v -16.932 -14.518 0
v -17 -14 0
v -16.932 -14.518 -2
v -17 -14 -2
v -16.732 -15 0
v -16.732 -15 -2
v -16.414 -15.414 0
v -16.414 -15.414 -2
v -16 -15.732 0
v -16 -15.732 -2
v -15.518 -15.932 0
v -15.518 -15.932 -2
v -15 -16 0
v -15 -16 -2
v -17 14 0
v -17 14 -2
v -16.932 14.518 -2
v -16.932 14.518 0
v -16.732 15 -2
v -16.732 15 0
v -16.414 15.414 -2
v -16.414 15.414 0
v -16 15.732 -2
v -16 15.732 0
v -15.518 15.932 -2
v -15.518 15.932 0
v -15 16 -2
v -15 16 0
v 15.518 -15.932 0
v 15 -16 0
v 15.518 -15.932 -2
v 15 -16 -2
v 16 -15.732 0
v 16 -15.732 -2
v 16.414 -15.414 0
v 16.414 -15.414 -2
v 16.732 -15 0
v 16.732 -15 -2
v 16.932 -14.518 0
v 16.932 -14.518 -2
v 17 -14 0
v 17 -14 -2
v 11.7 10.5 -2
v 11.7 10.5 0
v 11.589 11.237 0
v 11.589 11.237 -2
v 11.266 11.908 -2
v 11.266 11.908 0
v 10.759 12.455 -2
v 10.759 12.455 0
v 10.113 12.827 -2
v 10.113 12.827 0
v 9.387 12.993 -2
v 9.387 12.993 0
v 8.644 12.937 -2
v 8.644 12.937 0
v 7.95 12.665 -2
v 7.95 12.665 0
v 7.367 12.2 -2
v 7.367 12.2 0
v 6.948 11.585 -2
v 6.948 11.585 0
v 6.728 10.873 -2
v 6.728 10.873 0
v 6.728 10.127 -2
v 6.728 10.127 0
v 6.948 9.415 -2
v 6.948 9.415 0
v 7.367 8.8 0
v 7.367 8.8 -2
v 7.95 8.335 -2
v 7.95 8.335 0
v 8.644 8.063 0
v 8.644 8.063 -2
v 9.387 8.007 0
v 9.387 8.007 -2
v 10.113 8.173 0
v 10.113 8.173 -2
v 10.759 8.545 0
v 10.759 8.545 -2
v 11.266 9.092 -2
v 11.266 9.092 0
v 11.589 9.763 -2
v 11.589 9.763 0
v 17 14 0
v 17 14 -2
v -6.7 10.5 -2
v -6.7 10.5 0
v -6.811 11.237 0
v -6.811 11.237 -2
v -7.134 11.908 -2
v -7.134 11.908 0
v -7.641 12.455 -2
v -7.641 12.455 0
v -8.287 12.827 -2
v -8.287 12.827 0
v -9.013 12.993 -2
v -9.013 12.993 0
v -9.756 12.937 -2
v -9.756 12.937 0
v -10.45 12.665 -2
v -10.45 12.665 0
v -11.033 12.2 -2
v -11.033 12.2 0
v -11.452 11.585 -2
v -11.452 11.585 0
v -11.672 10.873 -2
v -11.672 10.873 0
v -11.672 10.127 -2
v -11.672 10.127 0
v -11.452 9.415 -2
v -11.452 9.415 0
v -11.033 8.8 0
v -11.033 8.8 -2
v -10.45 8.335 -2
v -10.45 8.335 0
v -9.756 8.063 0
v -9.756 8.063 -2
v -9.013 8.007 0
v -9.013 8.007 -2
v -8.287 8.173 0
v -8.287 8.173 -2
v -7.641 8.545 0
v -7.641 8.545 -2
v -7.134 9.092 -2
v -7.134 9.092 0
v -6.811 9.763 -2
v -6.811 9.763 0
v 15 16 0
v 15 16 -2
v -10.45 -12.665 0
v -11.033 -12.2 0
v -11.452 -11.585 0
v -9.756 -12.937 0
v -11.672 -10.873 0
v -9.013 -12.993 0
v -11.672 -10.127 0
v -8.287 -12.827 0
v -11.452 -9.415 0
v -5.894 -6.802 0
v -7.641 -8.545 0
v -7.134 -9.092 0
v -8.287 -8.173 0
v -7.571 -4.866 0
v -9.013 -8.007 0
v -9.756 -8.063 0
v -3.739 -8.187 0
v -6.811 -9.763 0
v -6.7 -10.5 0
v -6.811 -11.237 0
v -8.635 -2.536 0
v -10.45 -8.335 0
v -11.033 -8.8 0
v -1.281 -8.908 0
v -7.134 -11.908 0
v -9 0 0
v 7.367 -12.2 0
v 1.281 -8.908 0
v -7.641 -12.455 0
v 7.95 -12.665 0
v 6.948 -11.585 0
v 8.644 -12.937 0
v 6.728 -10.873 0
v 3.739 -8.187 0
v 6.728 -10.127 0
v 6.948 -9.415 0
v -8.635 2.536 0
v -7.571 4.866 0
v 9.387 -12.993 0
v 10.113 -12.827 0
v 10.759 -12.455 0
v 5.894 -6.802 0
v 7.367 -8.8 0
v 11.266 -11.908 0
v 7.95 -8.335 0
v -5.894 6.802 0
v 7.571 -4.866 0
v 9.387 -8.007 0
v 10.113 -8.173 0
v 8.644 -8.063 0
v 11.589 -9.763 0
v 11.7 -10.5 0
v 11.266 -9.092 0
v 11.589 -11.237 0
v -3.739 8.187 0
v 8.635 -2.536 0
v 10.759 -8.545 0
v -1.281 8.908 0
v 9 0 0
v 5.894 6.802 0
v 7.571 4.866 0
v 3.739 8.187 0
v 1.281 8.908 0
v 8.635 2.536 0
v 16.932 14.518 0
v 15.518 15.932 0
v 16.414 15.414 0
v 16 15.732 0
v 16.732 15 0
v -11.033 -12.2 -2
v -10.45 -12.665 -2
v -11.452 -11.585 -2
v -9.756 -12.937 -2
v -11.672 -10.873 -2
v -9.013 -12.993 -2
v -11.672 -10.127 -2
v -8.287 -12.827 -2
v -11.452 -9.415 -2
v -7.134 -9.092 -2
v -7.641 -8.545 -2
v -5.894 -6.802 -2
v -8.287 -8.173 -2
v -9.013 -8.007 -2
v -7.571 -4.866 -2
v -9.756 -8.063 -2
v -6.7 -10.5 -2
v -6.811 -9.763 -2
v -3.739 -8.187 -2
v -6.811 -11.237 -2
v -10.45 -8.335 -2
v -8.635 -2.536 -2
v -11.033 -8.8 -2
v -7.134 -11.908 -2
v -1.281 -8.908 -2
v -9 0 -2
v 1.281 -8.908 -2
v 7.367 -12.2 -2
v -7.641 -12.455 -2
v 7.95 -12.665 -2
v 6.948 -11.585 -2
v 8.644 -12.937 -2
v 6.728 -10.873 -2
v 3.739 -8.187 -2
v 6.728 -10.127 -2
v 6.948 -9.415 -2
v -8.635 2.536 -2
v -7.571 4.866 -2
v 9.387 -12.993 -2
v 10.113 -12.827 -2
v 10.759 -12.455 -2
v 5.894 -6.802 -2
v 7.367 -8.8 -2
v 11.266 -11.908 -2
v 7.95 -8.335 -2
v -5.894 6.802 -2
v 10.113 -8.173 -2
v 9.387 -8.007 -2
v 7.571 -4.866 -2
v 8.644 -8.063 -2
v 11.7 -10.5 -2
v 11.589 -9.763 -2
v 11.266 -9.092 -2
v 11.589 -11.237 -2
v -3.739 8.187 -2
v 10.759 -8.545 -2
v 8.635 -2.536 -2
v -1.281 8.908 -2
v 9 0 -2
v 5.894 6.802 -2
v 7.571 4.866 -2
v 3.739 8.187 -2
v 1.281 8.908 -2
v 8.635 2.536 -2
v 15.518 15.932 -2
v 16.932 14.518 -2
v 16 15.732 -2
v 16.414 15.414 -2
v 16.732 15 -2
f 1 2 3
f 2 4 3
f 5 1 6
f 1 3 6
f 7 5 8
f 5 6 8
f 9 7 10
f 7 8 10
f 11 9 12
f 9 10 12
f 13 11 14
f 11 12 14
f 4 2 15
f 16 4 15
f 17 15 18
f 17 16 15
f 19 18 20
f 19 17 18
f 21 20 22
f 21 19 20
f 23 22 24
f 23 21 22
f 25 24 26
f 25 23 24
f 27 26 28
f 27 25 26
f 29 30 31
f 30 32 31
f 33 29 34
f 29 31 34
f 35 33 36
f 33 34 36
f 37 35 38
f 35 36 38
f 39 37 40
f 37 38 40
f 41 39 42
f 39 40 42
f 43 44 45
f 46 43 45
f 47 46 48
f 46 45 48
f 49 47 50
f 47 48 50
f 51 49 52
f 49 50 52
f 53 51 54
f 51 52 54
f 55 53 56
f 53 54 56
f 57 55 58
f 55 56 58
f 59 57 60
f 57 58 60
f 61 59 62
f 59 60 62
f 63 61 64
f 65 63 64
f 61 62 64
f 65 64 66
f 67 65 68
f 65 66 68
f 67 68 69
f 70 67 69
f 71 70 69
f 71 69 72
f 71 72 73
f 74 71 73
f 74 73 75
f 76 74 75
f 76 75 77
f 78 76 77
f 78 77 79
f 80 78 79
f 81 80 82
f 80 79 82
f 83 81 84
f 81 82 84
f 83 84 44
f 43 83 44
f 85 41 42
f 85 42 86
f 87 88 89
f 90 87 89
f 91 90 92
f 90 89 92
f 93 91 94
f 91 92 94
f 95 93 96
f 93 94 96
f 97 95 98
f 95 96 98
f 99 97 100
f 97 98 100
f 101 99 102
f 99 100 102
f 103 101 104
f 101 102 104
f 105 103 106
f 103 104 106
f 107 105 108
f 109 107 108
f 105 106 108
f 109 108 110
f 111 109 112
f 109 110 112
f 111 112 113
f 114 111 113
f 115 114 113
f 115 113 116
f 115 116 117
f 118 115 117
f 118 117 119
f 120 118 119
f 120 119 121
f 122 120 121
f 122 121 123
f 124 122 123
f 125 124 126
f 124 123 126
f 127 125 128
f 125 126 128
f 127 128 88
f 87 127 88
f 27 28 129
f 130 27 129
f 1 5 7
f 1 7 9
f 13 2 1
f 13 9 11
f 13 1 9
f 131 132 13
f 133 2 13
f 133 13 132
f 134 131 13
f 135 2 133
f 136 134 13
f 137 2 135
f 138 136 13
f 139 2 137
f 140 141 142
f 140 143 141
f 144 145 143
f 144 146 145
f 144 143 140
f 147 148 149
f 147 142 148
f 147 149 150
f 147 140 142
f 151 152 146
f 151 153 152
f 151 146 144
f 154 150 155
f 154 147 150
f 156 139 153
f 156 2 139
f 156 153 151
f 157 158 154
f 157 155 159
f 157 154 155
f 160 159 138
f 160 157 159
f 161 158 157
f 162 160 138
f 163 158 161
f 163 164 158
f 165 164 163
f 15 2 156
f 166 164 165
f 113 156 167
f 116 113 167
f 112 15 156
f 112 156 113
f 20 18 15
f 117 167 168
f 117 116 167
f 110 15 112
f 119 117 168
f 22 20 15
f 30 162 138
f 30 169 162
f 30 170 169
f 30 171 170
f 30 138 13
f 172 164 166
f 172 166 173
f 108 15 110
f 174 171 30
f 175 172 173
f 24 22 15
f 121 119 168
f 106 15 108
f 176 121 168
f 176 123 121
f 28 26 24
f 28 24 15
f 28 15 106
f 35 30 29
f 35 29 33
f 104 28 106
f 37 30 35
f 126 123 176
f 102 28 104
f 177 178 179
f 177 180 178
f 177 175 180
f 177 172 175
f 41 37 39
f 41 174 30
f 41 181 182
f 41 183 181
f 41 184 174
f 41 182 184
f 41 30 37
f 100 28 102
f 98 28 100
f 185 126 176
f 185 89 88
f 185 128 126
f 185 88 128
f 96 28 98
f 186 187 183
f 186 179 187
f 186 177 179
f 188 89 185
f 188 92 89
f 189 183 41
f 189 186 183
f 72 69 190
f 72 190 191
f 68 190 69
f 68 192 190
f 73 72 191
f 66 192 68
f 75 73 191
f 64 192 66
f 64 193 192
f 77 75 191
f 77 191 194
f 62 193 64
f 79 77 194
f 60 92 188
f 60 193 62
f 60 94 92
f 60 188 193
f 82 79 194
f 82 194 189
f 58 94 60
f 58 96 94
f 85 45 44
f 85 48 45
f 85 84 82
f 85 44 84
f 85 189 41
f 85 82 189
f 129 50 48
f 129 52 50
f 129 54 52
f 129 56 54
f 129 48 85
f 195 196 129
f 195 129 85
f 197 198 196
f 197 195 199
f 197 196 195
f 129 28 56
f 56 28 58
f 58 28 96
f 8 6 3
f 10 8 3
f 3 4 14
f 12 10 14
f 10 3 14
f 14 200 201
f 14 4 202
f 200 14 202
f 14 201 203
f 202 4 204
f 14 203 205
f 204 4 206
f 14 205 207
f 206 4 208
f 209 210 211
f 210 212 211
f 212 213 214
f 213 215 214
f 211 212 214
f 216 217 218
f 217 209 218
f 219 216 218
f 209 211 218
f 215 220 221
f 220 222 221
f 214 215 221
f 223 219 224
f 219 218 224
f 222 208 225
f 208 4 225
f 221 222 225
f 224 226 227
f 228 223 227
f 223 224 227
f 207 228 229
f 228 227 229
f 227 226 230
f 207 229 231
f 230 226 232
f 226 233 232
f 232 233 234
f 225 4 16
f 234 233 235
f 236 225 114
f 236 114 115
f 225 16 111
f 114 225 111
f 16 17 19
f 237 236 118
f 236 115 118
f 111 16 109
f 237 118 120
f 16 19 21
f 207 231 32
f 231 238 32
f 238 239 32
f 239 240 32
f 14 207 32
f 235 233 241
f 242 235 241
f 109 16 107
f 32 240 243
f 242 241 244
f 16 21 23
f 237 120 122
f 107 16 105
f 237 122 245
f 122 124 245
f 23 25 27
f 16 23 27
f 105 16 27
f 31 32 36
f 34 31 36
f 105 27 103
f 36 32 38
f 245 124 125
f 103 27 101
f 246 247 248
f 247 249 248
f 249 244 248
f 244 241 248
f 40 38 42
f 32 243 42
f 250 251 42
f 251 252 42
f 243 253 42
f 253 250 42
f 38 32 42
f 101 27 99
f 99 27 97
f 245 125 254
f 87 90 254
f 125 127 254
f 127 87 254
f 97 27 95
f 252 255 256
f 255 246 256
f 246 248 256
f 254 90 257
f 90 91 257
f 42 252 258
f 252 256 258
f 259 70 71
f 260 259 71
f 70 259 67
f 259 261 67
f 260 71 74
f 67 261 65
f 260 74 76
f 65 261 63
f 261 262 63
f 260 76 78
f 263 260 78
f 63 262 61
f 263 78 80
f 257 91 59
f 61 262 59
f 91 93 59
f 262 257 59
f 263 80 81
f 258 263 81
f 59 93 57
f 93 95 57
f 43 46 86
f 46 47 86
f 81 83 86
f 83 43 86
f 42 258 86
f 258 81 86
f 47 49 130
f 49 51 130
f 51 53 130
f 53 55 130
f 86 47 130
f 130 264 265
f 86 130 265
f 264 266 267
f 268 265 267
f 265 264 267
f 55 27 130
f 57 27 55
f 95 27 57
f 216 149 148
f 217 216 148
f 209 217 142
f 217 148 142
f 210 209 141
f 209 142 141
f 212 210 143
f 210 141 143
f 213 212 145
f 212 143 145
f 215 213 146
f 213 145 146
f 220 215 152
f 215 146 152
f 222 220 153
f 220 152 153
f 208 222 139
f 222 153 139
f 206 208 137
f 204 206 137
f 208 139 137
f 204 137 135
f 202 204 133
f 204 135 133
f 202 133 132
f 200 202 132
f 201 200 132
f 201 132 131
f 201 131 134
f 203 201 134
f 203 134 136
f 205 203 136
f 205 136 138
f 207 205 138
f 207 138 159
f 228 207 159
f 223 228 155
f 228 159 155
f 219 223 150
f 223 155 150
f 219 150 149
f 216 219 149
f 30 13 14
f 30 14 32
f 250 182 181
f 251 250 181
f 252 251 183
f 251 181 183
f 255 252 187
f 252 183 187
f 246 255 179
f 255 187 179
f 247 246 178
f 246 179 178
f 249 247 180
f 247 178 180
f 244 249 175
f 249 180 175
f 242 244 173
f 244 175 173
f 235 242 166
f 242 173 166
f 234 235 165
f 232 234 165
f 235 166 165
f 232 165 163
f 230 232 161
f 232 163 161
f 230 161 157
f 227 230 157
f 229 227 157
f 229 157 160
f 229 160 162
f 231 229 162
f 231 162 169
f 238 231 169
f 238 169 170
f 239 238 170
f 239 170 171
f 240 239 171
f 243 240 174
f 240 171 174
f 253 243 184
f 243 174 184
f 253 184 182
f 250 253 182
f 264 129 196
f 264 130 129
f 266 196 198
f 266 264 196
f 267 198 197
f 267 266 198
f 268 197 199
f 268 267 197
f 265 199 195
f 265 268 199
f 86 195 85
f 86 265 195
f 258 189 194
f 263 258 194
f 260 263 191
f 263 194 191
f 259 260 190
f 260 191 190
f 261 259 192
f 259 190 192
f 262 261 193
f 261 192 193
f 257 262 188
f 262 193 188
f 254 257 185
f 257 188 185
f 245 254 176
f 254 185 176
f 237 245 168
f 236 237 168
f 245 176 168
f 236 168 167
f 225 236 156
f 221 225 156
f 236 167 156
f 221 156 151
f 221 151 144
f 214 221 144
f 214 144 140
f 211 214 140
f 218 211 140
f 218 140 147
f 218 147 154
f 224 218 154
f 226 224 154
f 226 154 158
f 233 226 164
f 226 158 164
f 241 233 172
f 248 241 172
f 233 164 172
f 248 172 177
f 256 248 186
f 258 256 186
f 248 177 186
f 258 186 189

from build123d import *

# Parameters (mm, degrees)
SKETCH001_W   = 34
SKETCH001_H   = 32
SKETCH001_R   = 2.5
SKETCH001_R_2 = 9
PAD001_DEPTH  = 2
FILLET_R      = 2


with BuildPart() as part:
    # Sketch001 → Pad001 (new body)
    with BuildSketch(Plane.XY):
        Rectangle(SKETCH001_W, SKETCH001_H)
        with Locations((-9.2, 10.5)):
            Circle(SKETCH001_R, mode=Mode.SUBTRACT)
        with Locations((9.2, 10.5)):
            Circle(SKETCH001_R, mode=Mode.SUBTRACT)
        with Locations((-9.2, -10.5)):
            Circle(SKETCH001_R, mode=Mode.SUBTRACT)
        with Locations((9.2, -10.5)):
            Circle(SKETCH001_R, mode=Mode.SUBTRACT)
        Circle(SKETCH001_R_2, mode=Mode.SUBTRACT)
    extrude(amount=-PAD001_DEPTH)

    # Fillet
    fillet_edges = [part.edges().sort_by_distance(p)[0] for p in [
        (17, -16, -1),
        (17, 16, -1),
        (-17, -16, -1),
        (-17, 16, -1),
    ]]
    fillet(fillet_edges, radius=FILLET_R)


solid = part.part
